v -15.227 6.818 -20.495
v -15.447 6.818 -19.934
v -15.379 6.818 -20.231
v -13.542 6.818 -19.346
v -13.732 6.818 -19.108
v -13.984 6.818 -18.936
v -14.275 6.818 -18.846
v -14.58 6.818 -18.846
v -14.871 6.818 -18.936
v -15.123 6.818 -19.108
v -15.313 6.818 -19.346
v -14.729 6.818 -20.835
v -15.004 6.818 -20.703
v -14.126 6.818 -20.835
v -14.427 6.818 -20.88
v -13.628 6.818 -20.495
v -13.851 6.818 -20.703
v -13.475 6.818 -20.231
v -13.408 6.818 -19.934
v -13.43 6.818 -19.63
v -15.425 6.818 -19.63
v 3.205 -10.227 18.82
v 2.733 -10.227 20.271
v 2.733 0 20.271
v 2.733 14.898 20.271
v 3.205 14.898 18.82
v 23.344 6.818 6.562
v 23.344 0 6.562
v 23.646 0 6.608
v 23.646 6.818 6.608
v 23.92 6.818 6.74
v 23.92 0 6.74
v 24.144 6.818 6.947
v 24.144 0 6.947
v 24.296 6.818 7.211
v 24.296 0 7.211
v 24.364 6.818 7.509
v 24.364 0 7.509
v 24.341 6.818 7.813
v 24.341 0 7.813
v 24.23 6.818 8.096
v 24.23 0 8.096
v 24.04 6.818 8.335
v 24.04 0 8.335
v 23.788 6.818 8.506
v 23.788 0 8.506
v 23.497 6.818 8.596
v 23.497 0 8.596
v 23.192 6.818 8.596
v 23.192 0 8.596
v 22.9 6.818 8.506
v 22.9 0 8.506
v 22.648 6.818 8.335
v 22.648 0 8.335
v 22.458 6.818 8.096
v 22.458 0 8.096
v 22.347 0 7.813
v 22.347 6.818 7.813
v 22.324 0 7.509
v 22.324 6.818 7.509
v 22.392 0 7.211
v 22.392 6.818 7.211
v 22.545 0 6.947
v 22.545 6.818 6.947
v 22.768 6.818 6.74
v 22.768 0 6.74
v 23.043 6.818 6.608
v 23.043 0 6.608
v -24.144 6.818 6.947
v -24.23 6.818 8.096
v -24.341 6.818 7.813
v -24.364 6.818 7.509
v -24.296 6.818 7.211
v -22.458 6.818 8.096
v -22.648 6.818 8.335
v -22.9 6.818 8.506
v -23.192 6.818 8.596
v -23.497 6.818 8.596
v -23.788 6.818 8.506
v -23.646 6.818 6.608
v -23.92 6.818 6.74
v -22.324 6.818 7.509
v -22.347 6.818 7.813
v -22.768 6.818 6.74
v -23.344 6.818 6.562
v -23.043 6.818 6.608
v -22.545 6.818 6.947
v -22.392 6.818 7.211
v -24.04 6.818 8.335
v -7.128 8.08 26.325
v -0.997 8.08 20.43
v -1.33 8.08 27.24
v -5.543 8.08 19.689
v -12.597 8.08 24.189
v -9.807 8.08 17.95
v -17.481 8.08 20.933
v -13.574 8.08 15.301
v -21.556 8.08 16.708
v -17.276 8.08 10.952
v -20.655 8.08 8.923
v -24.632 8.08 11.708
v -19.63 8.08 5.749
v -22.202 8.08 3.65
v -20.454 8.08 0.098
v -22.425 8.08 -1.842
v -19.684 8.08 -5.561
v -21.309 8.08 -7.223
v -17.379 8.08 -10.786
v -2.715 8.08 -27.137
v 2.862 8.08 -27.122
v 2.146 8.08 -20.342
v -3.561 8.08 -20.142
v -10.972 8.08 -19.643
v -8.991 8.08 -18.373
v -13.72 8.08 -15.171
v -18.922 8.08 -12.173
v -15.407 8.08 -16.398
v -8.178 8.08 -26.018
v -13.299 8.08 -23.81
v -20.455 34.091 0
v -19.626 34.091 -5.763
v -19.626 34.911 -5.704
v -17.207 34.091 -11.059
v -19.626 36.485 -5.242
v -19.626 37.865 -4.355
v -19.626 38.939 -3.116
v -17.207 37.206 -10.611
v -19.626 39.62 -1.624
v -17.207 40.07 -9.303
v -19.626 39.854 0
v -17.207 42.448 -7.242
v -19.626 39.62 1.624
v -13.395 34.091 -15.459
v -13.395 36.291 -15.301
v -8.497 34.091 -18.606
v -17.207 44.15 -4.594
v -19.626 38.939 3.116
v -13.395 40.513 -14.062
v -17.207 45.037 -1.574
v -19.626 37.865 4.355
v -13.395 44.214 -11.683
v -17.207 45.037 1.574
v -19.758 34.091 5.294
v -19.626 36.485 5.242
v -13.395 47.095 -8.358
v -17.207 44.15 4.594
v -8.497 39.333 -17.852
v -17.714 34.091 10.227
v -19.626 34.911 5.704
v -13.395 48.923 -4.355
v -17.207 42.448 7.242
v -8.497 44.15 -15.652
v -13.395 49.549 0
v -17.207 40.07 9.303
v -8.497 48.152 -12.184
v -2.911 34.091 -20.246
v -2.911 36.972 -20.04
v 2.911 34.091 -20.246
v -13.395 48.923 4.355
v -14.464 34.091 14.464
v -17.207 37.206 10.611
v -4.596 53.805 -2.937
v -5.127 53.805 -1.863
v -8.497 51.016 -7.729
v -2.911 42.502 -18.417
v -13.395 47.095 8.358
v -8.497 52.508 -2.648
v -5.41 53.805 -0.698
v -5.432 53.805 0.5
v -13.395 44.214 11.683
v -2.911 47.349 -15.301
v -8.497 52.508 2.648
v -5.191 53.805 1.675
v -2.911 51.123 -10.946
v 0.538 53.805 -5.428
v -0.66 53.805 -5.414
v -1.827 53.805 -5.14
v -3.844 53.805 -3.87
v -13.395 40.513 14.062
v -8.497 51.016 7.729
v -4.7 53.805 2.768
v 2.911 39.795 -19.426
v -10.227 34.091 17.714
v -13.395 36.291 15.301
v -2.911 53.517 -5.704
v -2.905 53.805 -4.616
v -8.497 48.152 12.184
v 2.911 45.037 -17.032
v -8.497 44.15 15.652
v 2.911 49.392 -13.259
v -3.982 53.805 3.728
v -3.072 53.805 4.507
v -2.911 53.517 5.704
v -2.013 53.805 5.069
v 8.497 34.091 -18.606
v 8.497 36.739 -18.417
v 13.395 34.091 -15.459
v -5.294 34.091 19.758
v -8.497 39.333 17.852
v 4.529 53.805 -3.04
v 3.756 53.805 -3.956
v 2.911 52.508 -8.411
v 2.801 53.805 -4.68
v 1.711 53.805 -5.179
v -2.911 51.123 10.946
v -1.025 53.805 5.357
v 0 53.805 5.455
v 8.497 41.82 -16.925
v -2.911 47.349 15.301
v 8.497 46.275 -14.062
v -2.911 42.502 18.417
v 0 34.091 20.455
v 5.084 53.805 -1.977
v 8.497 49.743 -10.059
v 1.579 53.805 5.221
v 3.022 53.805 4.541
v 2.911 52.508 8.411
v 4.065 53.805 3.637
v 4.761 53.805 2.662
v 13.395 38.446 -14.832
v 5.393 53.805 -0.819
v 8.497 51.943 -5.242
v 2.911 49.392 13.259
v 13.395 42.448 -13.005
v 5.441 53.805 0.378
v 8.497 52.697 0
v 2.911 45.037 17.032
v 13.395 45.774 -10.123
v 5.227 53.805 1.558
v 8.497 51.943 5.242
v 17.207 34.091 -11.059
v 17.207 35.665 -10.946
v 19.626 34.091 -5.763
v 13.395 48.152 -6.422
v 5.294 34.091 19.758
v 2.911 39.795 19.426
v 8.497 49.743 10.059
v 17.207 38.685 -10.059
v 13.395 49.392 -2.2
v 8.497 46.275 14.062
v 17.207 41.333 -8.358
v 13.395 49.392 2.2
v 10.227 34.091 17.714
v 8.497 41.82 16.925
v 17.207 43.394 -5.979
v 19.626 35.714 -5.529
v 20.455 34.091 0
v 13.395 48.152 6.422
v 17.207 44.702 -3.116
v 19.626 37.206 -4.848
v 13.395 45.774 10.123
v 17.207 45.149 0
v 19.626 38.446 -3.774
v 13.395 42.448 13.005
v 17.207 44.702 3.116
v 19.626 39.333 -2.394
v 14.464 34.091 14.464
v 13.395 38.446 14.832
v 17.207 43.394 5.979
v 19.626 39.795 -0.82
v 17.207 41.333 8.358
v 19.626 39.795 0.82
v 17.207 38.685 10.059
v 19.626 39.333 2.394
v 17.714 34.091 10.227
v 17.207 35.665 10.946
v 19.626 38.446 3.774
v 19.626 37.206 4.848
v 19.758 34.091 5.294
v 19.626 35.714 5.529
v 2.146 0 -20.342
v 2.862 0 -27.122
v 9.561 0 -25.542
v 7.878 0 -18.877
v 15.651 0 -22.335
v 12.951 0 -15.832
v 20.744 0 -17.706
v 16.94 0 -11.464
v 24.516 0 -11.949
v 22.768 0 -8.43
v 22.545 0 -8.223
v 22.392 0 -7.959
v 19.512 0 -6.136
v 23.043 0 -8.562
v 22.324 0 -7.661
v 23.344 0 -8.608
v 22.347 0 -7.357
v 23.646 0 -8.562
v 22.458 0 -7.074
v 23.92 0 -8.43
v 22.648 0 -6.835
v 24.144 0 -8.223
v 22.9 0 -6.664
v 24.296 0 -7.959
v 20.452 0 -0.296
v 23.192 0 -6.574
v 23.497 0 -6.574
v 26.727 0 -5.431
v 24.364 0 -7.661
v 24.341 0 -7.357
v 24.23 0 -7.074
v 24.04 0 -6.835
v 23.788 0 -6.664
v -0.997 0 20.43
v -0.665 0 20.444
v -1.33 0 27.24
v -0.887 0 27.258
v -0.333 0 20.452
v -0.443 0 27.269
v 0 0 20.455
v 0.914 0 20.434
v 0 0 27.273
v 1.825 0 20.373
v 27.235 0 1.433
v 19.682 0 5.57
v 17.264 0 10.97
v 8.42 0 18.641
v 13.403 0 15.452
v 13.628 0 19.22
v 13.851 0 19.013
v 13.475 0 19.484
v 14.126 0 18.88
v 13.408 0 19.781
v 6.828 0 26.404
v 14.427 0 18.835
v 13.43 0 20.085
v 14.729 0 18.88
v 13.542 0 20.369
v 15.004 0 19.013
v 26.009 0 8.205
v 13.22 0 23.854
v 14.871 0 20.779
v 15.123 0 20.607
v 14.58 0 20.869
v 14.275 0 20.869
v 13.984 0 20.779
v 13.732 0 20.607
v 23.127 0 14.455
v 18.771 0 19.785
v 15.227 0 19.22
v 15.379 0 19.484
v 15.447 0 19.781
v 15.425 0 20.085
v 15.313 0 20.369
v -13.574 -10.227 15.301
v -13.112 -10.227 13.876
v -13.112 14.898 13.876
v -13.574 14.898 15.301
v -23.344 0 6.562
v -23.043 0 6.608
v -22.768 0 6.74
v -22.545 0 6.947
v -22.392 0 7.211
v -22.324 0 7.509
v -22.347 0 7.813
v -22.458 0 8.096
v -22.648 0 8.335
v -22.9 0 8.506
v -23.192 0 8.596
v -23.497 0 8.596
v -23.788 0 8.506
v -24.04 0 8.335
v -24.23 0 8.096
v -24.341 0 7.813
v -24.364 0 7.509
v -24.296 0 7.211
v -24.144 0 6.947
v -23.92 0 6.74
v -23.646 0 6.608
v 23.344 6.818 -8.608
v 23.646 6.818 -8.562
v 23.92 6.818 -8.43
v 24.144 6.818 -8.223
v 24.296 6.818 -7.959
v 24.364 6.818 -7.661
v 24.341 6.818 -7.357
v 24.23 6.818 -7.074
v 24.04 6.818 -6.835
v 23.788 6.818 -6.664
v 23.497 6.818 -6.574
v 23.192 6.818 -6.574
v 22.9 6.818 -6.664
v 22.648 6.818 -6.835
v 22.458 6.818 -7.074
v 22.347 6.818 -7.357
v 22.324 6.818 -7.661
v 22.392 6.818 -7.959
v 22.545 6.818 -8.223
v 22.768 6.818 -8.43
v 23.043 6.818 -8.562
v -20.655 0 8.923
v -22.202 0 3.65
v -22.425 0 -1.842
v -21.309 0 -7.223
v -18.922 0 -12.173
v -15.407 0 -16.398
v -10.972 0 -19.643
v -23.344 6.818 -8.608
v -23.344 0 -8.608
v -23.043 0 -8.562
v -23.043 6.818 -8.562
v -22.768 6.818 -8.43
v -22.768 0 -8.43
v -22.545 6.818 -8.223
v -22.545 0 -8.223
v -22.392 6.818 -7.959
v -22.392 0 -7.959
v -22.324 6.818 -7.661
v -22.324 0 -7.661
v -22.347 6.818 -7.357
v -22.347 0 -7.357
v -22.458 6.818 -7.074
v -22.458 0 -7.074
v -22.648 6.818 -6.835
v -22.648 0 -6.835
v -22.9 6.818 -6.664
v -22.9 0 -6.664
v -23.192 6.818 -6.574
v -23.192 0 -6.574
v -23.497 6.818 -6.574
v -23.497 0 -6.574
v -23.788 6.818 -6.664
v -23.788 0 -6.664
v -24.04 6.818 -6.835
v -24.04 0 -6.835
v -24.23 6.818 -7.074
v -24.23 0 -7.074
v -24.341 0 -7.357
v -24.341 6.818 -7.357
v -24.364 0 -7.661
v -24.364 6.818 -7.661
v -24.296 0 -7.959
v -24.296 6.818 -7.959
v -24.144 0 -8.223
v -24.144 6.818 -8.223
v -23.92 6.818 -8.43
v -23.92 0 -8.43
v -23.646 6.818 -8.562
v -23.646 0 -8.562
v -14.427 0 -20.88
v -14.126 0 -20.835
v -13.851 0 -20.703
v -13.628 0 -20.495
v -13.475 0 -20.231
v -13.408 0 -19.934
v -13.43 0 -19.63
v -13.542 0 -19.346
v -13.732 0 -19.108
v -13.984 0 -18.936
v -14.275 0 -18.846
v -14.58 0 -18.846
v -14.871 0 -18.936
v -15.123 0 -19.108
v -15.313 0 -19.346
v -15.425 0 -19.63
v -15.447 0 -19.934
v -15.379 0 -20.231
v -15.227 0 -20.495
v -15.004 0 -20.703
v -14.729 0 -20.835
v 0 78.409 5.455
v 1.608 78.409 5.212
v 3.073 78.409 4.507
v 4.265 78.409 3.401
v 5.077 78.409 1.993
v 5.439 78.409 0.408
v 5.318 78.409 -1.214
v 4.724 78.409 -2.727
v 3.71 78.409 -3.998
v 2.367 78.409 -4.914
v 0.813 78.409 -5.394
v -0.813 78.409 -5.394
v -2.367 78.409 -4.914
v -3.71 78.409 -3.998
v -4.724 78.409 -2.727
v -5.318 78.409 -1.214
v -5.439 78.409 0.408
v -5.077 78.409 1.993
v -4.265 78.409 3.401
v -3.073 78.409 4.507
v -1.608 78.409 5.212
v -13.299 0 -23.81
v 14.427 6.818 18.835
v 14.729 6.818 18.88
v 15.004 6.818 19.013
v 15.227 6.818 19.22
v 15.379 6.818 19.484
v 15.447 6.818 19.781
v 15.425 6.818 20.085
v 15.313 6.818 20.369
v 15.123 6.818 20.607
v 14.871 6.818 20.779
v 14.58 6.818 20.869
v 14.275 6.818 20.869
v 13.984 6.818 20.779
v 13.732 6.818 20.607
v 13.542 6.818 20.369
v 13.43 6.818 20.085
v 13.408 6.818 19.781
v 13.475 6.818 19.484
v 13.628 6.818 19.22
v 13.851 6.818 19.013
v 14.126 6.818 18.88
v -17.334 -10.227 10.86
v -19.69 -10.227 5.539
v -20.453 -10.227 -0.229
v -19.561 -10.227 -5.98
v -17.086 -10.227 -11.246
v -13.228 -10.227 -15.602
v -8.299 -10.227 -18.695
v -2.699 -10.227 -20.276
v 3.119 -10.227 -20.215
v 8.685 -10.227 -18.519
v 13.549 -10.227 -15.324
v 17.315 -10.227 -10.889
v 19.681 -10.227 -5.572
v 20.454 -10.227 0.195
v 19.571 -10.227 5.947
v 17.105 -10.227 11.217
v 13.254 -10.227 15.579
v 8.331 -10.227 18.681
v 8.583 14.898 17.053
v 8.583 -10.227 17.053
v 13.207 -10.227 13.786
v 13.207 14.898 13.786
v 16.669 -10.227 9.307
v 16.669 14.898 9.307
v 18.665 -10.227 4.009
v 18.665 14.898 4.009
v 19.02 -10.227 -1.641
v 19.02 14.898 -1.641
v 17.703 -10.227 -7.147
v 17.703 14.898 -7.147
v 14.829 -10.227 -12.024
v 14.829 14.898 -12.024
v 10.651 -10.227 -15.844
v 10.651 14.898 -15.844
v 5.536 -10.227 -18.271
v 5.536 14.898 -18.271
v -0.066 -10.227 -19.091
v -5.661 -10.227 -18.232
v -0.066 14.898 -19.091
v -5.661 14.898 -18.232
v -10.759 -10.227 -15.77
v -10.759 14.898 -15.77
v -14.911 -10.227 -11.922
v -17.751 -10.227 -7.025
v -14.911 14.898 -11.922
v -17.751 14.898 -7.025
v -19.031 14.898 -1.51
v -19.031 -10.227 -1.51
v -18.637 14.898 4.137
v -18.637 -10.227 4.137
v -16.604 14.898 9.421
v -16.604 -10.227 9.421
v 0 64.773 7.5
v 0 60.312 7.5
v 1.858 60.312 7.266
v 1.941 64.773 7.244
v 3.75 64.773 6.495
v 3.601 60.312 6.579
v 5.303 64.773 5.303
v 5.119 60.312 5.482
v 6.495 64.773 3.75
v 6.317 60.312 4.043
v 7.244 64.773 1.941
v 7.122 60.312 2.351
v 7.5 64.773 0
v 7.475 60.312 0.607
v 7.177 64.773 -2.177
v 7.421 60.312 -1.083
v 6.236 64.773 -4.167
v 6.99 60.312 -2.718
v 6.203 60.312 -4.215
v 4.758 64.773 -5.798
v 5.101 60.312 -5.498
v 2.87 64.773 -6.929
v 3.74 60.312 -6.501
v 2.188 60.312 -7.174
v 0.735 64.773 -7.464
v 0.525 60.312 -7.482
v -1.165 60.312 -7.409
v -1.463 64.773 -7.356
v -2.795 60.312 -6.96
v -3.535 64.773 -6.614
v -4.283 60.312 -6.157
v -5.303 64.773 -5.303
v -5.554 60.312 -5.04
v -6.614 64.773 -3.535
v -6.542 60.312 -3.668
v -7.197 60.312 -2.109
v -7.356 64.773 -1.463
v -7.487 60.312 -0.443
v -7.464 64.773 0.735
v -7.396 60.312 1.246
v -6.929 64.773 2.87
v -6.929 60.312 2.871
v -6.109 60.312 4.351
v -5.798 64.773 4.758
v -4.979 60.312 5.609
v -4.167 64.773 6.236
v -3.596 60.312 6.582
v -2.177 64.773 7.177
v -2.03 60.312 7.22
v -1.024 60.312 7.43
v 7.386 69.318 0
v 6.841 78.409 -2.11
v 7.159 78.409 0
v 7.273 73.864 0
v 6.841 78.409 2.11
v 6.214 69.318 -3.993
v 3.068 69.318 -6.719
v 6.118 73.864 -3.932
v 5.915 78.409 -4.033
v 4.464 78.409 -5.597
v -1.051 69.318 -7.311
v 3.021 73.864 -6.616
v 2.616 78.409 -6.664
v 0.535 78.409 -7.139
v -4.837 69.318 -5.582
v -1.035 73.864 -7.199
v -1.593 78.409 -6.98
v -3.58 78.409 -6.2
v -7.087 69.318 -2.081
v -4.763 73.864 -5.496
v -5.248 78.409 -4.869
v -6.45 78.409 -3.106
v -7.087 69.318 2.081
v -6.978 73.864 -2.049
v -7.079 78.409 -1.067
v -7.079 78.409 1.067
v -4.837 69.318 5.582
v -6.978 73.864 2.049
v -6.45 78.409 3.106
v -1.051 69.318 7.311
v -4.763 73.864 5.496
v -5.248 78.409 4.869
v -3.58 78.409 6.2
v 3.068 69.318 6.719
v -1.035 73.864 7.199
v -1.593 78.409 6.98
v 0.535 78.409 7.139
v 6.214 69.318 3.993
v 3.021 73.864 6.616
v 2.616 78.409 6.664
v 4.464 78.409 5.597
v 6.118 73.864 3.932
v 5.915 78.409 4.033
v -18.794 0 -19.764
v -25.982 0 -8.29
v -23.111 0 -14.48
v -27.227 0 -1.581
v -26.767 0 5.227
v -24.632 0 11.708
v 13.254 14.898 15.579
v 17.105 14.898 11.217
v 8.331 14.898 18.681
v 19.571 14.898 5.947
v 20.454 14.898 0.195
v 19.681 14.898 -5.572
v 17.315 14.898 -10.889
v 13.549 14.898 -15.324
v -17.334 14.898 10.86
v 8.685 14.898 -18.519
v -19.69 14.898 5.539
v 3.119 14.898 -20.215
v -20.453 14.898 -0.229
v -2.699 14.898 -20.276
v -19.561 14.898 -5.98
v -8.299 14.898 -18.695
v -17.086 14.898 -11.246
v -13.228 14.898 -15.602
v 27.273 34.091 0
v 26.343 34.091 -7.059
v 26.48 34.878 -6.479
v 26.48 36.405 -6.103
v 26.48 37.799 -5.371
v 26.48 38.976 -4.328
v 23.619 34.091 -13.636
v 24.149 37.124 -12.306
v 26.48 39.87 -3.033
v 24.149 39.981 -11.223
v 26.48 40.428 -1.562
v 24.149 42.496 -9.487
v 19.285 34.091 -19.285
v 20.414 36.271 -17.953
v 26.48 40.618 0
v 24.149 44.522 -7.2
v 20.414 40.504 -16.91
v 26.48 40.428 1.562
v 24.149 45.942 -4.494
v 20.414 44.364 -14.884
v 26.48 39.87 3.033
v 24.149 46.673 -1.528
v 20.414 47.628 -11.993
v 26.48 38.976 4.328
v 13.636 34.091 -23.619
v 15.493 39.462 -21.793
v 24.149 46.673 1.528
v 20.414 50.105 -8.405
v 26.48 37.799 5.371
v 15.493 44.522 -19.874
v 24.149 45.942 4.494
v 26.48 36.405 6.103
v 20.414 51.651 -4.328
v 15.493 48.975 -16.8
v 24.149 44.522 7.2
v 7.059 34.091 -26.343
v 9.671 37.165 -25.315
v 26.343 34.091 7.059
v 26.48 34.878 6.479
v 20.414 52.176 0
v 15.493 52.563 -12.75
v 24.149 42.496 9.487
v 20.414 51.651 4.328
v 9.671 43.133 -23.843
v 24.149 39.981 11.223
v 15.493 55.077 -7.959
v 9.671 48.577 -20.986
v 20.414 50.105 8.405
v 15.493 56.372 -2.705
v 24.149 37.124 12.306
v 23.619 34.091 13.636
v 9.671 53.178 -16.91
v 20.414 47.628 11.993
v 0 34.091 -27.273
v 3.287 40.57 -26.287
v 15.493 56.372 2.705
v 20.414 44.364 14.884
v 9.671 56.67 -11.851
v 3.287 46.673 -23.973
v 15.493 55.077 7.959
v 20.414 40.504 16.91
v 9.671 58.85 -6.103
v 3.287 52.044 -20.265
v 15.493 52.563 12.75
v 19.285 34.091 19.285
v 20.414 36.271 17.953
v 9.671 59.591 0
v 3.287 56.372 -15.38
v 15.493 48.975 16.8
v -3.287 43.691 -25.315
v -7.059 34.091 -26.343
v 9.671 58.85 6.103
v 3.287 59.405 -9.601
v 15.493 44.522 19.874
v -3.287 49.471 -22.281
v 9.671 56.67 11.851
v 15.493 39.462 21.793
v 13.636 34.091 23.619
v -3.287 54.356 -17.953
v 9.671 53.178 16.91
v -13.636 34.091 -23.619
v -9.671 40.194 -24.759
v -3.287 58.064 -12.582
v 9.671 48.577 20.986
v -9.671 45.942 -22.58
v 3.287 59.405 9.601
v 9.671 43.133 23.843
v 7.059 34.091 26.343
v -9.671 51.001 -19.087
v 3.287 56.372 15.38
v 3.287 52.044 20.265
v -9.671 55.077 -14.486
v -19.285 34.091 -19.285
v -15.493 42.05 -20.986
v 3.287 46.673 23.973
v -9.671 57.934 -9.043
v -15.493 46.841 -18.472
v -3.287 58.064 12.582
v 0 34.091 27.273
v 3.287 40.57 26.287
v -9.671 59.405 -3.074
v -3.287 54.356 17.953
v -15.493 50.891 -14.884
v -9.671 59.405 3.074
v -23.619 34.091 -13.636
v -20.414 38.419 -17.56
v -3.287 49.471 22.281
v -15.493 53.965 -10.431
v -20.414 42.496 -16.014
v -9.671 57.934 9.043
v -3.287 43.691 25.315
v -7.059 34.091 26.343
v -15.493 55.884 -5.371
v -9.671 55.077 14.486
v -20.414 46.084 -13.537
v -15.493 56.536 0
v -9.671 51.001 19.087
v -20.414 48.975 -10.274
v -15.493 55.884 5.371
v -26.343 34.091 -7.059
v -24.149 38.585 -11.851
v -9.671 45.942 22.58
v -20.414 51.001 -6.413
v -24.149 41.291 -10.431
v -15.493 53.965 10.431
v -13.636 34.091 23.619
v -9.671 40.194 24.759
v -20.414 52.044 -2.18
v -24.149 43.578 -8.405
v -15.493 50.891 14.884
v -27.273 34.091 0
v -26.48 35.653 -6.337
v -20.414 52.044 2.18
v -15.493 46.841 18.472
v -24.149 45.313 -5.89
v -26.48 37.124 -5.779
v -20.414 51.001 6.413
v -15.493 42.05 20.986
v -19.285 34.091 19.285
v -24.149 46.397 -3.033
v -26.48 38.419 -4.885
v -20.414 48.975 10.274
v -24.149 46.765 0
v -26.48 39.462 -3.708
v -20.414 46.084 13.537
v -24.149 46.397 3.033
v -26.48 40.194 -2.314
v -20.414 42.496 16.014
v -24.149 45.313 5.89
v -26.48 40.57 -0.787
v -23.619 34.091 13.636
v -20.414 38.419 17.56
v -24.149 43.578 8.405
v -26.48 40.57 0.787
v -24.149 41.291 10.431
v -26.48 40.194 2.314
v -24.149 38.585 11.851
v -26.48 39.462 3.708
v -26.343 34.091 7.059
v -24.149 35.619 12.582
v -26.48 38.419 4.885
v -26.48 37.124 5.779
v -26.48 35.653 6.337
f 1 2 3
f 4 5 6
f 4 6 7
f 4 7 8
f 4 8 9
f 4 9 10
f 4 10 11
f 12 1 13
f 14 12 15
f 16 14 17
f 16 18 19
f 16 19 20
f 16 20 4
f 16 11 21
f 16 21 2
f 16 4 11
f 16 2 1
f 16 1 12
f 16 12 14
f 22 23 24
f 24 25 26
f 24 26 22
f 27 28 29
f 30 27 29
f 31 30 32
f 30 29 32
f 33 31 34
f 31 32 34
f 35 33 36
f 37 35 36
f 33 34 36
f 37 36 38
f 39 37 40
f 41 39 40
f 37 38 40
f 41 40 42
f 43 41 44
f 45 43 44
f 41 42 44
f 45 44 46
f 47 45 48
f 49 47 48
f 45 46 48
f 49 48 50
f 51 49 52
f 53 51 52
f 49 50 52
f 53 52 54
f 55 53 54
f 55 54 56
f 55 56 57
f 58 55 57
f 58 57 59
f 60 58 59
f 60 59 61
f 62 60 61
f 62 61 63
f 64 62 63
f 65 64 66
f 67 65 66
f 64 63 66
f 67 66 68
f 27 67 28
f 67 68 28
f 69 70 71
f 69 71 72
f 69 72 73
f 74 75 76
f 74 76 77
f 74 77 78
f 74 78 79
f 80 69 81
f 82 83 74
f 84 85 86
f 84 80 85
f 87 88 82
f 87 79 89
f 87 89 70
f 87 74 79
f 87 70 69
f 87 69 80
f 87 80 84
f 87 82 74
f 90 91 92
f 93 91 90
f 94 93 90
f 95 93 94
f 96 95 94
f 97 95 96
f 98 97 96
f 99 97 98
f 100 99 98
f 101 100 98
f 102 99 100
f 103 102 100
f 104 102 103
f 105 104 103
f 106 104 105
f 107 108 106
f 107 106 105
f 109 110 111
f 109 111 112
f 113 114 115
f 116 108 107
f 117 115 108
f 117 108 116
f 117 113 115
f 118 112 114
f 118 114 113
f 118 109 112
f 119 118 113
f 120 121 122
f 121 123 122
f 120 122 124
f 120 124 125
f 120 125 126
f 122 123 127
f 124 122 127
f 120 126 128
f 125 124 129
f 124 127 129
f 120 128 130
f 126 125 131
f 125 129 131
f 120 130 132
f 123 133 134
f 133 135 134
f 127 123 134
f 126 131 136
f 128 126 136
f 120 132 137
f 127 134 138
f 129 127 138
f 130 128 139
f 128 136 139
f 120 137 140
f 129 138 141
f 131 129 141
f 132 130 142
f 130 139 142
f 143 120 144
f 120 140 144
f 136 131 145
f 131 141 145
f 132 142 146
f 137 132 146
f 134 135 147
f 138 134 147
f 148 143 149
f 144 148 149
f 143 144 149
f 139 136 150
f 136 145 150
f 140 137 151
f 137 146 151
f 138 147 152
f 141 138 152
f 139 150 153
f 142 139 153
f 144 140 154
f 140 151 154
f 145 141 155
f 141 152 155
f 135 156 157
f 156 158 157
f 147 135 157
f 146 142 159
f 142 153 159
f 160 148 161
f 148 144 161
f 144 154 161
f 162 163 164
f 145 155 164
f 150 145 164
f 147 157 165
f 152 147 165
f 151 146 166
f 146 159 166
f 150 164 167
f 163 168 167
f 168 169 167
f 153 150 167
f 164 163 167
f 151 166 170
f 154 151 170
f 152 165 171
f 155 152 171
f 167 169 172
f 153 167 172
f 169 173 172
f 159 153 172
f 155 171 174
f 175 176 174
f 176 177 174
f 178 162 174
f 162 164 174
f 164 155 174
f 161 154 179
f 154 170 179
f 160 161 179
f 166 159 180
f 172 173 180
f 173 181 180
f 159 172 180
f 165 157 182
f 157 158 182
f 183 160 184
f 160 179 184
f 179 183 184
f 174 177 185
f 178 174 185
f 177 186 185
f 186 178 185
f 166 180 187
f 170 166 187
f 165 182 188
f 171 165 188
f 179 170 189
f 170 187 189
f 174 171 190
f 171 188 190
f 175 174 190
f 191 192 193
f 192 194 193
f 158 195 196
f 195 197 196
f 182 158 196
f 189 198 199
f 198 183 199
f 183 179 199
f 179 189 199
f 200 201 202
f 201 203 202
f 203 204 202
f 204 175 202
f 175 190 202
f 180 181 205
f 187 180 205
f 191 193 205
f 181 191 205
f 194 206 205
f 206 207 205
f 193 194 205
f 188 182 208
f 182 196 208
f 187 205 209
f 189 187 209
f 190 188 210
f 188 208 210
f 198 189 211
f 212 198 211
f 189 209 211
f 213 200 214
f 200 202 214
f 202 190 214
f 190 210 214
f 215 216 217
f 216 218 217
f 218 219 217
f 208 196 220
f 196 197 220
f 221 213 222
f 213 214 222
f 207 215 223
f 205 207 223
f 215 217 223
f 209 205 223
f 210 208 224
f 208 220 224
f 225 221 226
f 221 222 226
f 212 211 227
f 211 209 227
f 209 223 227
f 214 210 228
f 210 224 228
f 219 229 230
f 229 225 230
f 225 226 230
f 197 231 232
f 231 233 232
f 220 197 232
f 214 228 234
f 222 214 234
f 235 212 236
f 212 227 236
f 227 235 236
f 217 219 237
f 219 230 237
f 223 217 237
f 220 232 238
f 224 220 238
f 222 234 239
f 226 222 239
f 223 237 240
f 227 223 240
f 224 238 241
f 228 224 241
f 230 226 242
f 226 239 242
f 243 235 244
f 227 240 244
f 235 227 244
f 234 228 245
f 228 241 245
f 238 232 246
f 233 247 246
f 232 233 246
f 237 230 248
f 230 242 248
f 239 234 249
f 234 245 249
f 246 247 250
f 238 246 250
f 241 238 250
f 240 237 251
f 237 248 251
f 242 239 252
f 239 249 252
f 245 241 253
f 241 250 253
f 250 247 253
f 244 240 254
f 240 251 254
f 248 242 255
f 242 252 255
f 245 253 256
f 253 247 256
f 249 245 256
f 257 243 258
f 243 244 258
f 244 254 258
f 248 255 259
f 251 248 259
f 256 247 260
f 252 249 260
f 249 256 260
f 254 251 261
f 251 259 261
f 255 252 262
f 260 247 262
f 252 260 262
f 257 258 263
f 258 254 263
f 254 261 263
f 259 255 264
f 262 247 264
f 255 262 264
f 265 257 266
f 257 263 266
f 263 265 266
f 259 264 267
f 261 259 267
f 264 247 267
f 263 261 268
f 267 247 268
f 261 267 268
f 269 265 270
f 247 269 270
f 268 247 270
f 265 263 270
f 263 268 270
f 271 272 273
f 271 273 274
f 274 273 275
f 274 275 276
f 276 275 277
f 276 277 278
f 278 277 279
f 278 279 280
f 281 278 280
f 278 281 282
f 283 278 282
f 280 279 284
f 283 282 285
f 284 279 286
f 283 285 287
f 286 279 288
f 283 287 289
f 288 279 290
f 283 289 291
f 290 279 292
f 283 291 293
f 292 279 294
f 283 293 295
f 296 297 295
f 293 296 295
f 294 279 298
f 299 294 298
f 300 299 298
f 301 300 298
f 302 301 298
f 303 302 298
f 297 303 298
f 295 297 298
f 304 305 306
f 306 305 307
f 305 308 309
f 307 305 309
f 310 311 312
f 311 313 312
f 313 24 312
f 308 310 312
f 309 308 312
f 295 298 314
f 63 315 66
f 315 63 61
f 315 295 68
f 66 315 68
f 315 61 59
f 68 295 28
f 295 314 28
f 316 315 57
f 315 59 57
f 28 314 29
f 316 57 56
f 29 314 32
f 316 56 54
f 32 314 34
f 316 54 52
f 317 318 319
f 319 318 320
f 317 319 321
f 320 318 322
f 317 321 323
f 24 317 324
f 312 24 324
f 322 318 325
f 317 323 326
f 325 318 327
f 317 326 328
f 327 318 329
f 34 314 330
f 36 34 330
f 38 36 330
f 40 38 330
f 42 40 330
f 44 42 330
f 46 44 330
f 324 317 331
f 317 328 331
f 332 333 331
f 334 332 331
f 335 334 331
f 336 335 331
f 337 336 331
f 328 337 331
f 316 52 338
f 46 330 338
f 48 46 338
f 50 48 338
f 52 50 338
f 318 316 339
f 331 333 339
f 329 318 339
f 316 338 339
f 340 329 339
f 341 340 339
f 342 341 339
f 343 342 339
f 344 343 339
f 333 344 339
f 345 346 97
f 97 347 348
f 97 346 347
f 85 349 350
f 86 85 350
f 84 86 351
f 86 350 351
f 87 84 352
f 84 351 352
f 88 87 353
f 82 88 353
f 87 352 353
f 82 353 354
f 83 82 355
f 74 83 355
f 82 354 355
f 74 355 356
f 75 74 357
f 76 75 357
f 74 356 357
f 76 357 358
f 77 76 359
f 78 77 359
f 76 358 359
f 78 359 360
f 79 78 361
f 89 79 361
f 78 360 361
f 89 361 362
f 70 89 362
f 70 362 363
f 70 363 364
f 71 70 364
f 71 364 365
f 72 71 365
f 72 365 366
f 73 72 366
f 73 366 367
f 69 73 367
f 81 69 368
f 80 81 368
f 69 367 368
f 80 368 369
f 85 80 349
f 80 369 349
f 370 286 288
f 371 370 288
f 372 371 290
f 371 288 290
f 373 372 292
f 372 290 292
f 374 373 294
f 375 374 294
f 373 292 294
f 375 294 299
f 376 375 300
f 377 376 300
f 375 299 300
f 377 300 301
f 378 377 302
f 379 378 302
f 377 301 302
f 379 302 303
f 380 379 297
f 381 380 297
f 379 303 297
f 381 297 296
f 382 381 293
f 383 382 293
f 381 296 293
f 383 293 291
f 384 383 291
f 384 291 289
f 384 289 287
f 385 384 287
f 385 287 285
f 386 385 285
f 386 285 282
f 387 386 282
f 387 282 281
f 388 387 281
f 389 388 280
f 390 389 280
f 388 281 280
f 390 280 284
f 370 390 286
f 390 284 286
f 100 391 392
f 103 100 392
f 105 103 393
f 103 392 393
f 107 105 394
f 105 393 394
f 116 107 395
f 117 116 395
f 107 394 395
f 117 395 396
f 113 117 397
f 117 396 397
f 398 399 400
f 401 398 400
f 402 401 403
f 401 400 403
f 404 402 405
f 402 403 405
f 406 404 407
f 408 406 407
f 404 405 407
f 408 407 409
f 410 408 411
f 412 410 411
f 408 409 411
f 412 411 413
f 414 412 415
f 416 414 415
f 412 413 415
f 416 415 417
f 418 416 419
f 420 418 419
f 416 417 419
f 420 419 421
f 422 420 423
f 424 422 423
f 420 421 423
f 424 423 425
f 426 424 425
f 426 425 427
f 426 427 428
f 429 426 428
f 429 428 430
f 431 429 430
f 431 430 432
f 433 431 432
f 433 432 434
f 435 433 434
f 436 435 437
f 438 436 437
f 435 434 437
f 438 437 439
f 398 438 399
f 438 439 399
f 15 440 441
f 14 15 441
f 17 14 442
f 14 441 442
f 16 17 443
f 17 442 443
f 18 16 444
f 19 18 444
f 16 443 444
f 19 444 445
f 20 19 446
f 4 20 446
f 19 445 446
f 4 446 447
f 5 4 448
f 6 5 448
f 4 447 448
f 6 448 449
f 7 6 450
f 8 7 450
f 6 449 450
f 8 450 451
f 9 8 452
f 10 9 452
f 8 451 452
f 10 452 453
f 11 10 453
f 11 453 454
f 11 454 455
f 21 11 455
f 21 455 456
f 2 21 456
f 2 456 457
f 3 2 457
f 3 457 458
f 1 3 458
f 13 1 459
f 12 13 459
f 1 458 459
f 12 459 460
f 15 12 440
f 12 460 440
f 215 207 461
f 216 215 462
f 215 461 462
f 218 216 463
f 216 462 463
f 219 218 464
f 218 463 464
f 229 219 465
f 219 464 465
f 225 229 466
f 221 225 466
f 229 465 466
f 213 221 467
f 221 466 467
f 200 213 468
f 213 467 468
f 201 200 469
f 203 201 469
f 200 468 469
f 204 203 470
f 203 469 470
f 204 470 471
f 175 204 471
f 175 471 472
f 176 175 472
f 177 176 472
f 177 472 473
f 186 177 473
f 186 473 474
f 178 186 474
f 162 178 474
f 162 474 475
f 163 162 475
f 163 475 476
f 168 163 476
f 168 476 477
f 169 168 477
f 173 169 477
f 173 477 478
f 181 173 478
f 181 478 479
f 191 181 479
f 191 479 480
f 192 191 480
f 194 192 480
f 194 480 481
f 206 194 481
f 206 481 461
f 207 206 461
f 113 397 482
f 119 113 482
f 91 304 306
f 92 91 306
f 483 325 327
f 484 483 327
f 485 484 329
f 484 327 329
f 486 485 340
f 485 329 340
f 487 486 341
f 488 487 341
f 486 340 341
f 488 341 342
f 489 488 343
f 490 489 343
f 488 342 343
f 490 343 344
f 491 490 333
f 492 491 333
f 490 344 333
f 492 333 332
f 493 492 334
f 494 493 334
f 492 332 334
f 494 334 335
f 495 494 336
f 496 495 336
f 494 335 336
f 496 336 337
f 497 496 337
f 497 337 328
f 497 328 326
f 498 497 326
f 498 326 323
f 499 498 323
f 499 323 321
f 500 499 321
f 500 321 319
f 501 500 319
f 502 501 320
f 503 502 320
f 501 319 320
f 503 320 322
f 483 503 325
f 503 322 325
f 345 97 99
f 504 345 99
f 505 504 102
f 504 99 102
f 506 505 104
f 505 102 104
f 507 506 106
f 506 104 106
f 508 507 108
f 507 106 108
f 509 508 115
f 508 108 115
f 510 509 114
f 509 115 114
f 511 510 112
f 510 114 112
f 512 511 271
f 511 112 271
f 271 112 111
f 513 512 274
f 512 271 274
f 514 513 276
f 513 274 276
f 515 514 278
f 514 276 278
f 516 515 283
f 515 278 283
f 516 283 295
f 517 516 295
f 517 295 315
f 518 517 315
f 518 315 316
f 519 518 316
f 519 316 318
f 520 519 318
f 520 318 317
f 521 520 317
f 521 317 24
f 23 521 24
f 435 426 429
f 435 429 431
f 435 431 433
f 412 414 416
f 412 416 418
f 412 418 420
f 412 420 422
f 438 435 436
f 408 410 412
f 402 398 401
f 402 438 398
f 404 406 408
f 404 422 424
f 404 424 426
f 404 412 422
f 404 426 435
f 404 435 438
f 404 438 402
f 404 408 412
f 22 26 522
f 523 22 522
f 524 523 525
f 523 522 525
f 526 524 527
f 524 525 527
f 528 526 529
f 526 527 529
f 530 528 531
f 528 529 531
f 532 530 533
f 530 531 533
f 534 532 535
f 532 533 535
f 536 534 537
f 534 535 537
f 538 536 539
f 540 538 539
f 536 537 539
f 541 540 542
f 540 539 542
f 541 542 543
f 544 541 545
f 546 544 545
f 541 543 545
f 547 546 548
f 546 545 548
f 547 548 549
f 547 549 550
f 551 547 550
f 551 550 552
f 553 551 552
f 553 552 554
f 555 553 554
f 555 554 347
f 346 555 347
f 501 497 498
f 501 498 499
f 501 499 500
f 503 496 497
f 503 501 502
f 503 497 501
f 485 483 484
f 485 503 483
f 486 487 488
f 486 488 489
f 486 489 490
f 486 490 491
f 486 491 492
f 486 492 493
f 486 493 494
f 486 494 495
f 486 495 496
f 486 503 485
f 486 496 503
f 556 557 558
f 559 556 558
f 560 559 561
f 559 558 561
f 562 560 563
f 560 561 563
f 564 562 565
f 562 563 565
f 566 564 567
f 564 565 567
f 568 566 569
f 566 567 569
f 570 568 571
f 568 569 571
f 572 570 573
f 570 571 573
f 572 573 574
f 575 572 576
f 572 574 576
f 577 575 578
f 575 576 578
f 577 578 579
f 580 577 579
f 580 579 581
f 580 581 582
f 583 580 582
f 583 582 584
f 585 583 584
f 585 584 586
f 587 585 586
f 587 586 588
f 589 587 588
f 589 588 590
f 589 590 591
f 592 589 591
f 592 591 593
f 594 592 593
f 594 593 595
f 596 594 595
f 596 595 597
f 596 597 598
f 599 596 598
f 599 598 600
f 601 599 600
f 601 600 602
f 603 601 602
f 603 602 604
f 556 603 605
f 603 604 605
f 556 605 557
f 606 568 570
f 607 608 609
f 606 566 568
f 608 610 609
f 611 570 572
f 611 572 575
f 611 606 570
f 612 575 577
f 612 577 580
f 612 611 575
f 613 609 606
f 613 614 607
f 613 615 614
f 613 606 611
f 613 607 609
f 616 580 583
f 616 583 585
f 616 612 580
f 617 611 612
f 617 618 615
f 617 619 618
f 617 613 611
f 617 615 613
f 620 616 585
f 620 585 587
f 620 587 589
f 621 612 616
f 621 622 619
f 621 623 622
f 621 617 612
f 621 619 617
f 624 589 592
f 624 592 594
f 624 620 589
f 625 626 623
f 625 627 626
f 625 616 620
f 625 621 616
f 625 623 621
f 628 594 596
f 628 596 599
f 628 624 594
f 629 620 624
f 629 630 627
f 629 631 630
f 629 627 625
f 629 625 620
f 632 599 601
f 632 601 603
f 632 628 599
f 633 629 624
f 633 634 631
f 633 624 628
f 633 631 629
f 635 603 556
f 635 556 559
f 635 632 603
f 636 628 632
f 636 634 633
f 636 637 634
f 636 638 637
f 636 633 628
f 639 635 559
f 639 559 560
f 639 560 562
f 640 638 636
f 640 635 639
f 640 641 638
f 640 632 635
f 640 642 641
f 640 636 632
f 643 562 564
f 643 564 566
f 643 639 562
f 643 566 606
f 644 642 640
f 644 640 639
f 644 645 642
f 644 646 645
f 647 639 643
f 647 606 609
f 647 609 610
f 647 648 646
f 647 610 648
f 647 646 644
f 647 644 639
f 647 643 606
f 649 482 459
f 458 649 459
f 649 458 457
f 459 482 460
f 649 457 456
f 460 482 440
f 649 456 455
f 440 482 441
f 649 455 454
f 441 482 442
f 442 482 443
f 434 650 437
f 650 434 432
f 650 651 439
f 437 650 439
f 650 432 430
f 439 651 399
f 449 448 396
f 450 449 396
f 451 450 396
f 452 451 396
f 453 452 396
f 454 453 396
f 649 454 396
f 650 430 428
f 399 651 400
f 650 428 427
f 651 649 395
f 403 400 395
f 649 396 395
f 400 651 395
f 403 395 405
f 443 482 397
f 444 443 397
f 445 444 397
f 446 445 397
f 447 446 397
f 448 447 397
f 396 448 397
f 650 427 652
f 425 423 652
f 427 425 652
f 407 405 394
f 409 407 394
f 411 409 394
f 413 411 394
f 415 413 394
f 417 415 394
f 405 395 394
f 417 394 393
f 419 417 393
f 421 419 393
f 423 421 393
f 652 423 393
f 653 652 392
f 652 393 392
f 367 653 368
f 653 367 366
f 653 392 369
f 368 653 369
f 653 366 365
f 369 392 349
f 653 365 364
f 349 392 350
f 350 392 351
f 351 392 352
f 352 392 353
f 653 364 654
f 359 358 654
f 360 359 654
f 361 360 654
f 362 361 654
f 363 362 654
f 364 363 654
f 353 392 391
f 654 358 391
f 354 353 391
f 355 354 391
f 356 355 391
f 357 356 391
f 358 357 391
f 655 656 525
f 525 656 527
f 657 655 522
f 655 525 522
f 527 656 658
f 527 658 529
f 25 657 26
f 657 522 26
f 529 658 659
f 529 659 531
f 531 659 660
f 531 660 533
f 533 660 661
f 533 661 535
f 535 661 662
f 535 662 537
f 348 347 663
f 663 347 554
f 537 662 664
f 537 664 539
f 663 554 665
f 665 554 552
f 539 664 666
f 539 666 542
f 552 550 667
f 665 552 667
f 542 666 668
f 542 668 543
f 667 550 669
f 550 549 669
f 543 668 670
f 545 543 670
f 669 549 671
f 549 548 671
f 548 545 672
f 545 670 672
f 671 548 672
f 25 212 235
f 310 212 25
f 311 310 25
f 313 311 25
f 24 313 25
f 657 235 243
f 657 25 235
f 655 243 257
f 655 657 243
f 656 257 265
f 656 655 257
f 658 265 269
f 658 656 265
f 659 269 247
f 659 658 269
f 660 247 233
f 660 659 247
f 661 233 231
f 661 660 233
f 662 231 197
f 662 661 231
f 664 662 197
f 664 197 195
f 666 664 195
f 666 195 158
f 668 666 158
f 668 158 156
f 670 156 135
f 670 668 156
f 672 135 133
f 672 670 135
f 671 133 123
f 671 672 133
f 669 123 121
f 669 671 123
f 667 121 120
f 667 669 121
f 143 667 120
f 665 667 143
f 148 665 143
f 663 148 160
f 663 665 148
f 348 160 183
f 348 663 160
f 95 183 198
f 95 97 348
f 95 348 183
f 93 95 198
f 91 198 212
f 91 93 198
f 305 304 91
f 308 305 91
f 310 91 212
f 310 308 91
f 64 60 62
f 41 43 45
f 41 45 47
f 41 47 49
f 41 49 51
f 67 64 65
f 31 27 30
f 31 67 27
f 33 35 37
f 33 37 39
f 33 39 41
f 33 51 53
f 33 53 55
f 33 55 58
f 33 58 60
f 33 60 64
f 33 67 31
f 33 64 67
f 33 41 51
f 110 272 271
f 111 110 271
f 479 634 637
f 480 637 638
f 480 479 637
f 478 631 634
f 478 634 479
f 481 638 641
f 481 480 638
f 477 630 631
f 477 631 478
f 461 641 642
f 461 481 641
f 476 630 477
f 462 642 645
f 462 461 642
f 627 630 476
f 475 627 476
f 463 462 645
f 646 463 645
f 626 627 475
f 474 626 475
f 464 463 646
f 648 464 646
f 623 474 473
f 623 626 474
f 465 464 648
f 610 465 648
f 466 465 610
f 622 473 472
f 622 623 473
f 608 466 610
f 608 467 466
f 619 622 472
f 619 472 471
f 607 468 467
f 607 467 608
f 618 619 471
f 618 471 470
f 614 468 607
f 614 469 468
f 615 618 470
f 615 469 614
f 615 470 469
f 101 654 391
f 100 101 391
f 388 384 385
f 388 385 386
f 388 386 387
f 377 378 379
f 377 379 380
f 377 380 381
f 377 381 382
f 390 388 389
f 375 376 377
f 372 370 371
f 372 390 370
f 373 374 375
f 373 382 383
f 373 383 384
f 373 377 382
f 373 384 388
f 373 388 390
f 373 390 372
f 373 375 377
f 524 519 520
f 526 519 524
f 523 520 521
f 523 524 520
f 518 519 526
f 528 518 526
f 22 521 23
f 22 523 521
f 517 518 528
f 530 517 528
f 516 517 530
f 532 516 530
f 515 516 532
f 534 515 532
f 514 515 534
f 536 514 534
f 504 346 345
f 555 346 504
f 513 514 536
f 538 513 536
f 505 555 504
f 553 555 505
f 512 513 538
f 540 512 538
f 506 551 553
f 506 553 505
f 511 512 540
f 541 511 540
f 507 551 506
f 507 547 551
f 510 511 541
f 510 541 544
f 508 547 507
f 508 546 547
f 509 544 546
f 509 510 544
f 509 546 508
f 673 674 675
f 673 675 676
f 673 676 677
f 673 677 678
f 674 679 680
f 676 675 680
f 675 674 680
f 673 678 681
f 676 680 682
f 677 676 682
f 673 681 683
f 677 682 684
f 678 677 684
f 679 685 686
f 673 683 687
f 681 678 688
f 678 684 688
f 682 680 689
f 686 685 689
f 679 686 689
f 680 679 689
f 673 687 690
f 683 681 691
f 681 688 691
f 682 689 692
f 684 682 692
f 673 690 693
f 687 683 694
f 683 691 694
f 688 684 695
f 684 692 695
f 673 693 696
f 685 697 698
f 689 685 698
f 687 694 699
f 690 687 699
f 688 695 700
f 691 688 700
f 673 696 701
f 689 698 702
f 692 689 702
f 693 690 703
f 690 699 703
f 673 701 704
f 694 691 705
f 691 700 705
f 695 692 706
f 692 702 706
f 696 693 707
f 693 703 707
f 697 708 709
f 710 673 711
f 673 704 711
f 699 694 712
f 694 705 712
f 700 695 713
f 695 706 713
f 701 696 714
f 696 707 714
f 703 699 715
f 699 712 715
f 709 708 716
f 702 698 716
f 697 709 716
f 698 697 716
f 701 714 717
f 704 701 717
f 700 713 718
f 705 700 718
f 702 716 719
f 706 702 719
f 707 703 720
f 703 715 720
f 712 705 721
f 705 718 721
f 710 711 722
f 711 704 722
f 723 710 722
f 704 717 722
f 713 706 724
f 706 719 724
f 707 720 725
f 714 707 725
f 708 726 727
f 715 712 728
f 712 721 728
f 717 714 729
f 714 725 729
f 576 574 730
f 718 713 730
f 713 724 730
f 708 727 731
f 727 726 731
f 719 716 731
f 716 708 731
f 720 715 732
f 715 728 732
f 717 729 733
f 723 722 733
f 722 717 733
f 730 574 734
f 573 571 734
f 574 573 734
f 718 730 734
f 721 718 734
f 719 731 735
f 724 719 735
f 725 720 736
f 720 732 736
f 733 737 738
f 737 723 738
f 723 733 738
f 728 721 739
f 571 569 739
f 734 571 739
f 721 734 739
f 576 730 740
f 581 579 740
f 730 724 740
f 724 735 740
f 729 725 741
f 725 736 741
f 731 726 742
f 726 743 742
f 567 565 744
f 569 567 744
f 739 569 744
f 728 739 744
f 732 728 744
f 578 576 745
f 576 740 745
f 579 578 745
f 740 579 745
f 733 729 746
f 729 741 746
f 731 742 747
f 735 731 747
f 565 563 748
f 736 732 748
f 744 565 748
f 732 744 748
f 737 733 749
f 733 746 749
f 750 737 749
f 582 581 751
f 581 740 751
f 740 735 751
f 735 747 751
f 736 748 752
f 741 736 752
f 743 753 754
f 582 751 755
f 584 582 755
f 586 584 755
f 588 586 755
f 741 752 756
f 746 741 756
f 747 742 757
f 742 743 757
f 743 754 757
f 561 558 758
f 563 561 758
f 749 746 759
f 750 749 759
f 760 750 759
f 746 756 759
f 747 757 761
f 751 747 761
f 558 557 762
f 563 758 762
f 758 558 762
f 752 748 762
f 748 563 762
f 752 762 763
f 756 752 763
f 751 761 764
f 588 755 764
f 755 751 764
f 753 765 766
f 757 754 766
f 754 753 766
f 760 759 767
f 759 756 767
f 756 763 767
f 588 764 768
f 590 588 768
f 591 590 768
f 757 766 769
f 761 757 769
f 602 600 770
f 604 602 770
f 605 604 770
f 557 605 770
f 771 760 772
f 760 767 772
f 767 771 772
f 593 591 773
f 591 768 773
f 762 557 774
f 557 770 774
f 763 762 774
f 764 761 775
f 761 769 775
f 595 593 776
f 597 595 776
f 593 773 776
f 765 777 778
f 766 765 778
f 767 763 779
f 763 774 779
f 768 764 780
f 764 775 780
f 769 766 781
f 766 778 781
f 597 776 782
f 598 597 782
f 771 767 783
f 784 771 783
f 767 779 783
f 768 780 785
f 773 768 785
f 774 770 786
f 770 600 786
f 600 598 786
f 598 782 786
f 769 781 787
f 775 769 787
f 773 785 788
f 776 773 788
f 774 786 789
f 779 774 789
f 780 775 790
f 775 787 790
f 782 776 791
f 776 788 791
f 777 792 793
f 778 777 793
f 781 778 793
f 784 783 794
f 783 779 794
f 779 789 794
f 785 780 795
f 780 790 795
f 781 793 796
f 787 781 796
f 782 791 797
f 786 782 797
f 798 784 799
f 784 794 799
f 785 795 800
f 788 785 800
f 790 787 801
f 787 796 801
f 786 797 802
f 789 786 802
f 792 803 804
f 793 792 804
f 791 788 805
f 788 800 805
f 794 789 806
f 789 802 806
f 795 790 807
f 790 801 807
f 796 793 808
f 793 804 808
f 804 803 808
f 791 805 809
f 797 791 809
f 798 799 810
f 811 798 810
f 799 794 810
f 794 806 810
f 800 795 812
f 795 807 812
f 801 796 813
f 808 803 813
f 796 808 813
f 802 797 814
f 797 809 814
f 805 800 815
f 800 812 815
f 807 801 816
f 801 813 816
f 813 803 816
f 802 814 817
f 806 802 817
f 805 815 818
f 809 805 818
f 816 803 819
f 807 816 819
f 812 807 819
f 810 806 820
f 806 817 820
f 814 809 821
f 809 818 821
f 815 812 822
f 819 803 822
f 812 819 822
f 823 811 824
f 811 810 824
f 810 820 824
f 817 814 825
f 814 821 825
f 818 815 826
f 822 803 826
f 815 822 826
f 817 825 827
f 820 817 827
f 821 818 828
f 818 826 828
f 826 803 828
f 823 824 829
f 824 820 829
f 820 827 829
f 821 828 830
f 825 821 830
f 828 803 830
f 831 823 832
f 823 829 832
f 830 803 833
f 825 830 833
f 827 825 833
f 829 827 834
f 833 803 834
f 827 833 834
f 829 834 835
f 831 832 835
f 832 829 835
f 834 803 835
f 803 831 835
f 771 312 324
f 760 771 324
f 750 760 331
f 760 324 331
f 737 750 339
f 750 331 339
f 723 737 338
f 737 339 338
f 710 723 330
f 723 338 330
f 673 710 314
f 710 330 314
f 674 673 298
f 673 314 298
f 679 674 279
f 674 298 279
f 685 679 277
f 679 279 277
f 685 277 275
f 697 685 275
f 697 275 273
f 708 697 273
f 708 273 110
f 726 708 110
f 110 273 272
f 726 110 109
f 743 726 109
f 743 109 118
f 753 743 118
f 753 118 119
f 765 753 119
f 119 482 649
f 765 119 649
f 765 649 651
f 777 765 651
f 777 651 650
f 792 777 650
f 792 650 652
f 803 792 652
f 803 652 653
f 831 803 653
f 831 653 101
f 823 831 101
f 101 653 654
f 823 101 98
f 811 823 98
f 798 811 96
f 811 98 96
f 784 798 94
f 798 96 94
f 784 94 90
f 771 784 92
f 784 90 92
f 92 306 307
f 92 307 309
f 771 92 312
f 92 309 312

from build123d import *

# Parameters (mm, degrees)
ESBO_O1_R                     = 40
ESBO_O1_R_2                   = 30
RESSALTO_EXTRUS_O1_DEPTH      = 50
ESBO_O2_R                     = 1.5
CORTE_EXTRUS_O1_DEPTH         = 10
CORTE_EXTRUS_O2_DEPTH         = 11.84997677
RESSALTO_EXTRUS_O2_DEPTH      = 26.84997677
RESSALTO_EXTRUS_O2_DEPTH_BACK = 10
REVOLU_O1_ANGLE               = 180
RESSALTO_EXTRUS_O5_DEPTH      = 5
RESSALTO_EXTRUS_O5_DEPTH_BACK = 2
ESBO_O10_R                    = 11
ESBO_O13_R                    = 8
CORTE_EXTRUS_O4_DEPTH         = 40
ESCALA1_SCALE                 = 0.681818182


# Read off the part's stored shape, not the designer's step: Limites1
with BuildPart() as part:
    # Esboço1 → Ressalto-extrusão1 (new body)
    with BuildSketch(Plane(origin=(0, 0, 0), x_dir=(1, 0, 0), z_dir=(0, 1, 0))):
        with Locations(Location((0, 0, 0), (0, 0, 270))):
            Circle(ESBO_O1_R)
        with Locations(Location((0, 0, 0), (0, 0, 270))):
            Circle(ESBO_O1_R_2, mode=Mode.SUBTRACT)
    extrude(amount=RESSALTO_EXTRUS_O1_DEPTH)

    # Esboço2 → Corte-extrusão1 (cut)
    with BuildSketch(Plane(origin=(0, 0, 0), x_dir=(-1, 0, 0), z_dir=(0, -1, 0))):
        with Locations(Location((-21.160269083, -29.124611797, 0), (0, 0, 90))):
            Circle(ESBO_O2_R)
        with Locations(Location((-34.238034587, -11.124611797, 0), (0, 0, 90))):
            Circle(ESBO_O2_R)
        with Locations(Location((-34.238034587, 11.124611797, 0), (0, 0, 90))):
            Circle(ESBO_O2_R)
        with Locations(Location((21.160269083, 29.124611797, 0), (0, 0, 90))):
            Circle(ESBO_O2_R)
        with Locations(Location((34.238034587, 11.124611797, 0), (0, 0, 90))):
            Circle(ESBO_O2_R)
        with Locations(Location((34.238034587, -11.124611797, 0), (0, 0, 90))):
            Circle(ESBO_O2_R)
    extrude(amount=-CORTE_EXTRUS_O1_DEPTH, mode=Mode.SUBTRACT)

    # Esboço3 → Corte-extrusão2 (cut)
    with BuildSketch(Plane(origin=(0, 0, 0), x_dir=(-1, 0, 0), z_dir=(0, -1, 0))):
        with BuildLine():
            ThreePointArc((30.293924668, -13.087327008), (31.253408489, 10.593604572), (16.092357529, 28.81034587))
            Line((16.092357529, 28.81034587), (19.505887914, 34.921631358))
            ThreePointArc((19.505887914, 34.921631358), (8.030354378, 39.185627576), (-4.197370073, 39.779166463))
            Line((-4.197370073, 39.779166463), (-3.148027555, 29.834374847))
            ThreePointArc((-3.148027555, 29.834374847), (29.911212101, 2.306380417), (1.462902849, -29.964310692))
            Line((1.462902849, -29.964310692), (1.950537132, -39.952414256))
            ThreePointArc((1.950537132, -39.952414256), (22.185986252, -33.283359416), (36.126859334, -17.171197823))
            Line((36.126859334, -17.171197823), (30.293924668, -13.087327008))
        make_face()
    extrude(amount=-CORTE_EXTRUS_O2_DEPTH, mode=Mode.SUBTRACT)

    # Esboço4 → Ressalto-extrusão2 (add, two sides: drawn at the far end of the back side and taken through both)
    with BuildSketch(Plane(origin=(0, 11.84997677, 0), x_dir=(-1, 0, 0), z_dir=(0, -1, 0)).offset(-RESSALTO_EXTRUS_O2_DEPTH_BACK)):
        with BuildLine():
            Line((-4.008838629, -29.730947056), (-4.700362463, -27.602655537))
            ThreePointArc((-4.700362463, -27.602655537), (-8.119302432, 26.79695744), (19.230258499, -20.351834268))
            Line((19.230258499, -20.351834268), (19.909240802, -22.441526924))
            ThreePointArc((19.909240802, -22.441526924), (-8.745833796, 28.696870757), (-4.008838629, -29.730947056))
        make_face()
    extrude(amount=RESSALTO_EXTRUS_O2_DEPTH + RESSALTO_EXTRUS_O2_DEPTH_BACK)

    # Esboço9 → Revolução1 (revolve)
    with BuildSketch(Plane(origin=(0, 50, 0), x_dir=(1, 0, 0), z_dir=(0, 1, 0))):
        with BuildLine():
            Line((-40, 0), (-30, 0))
            ThreePointArc((-30, 0), (0, 30), (30, 0))
            Line((30, 0), (40, 0))
            ThreePointArc((40, 0), (0, 40), (-40, 0))
        make_face()
    revolve(axis=Axis((-40, 50, 0), (1, 0, 0)), revolution_arc=REVOLU_O1_ANGLE)

    # Esboço10 → Ressalto-extrusão5 (add, two sides: drawn at the far end of the back side and taken through both)
    with BuildSketch(Plane(origin=(0, 90, 0), x_dir=(1, 0, 0), z_dir=(0, 1, 0)).offset(-RESSALTO_EXTRUS_O5_DEPTH_BACK)):
        with Locations(Location((0, 0, 0), (0, 0, 270))):
            Circle(ESBO_O10_R)
    extrude(amount=RESSALTO_EXTRUS_O5_DEPTH + RESSALTO_EXTRUS_O5_DEPTH_BACK)

    # Limites1 outline → Limites1 (revolve)
    with BuildSketch(Plane.XY):
        Polygon((11, 95), (10.5, 115), (0, 115), (0, 95), align=None)
    revolve(axis=Axis((0, 0, 0), (0, 1, 0)))

    # Esboço13 → Corte-extrusão4 (cut)
    with BuildSketch(Plane(origin=(0, 115, 0), x_dir=(1, 0, 0), z_dir=(0, 1, 0))):
        with Locations(Location((0, 0, 0), (0, 0, 270))):
            Circle(ESBO_O13_R)
    extrude(amount=-CORTE_EXTRUS_O4_DEPTH, mode=Mode.SUBTRACT)


with BuildPart() as part_1:
    # Escala1: scaled about (0, 0, 0)
    add(part.part.scale(ESCALA1_SCALE))


solid = part_1.part
